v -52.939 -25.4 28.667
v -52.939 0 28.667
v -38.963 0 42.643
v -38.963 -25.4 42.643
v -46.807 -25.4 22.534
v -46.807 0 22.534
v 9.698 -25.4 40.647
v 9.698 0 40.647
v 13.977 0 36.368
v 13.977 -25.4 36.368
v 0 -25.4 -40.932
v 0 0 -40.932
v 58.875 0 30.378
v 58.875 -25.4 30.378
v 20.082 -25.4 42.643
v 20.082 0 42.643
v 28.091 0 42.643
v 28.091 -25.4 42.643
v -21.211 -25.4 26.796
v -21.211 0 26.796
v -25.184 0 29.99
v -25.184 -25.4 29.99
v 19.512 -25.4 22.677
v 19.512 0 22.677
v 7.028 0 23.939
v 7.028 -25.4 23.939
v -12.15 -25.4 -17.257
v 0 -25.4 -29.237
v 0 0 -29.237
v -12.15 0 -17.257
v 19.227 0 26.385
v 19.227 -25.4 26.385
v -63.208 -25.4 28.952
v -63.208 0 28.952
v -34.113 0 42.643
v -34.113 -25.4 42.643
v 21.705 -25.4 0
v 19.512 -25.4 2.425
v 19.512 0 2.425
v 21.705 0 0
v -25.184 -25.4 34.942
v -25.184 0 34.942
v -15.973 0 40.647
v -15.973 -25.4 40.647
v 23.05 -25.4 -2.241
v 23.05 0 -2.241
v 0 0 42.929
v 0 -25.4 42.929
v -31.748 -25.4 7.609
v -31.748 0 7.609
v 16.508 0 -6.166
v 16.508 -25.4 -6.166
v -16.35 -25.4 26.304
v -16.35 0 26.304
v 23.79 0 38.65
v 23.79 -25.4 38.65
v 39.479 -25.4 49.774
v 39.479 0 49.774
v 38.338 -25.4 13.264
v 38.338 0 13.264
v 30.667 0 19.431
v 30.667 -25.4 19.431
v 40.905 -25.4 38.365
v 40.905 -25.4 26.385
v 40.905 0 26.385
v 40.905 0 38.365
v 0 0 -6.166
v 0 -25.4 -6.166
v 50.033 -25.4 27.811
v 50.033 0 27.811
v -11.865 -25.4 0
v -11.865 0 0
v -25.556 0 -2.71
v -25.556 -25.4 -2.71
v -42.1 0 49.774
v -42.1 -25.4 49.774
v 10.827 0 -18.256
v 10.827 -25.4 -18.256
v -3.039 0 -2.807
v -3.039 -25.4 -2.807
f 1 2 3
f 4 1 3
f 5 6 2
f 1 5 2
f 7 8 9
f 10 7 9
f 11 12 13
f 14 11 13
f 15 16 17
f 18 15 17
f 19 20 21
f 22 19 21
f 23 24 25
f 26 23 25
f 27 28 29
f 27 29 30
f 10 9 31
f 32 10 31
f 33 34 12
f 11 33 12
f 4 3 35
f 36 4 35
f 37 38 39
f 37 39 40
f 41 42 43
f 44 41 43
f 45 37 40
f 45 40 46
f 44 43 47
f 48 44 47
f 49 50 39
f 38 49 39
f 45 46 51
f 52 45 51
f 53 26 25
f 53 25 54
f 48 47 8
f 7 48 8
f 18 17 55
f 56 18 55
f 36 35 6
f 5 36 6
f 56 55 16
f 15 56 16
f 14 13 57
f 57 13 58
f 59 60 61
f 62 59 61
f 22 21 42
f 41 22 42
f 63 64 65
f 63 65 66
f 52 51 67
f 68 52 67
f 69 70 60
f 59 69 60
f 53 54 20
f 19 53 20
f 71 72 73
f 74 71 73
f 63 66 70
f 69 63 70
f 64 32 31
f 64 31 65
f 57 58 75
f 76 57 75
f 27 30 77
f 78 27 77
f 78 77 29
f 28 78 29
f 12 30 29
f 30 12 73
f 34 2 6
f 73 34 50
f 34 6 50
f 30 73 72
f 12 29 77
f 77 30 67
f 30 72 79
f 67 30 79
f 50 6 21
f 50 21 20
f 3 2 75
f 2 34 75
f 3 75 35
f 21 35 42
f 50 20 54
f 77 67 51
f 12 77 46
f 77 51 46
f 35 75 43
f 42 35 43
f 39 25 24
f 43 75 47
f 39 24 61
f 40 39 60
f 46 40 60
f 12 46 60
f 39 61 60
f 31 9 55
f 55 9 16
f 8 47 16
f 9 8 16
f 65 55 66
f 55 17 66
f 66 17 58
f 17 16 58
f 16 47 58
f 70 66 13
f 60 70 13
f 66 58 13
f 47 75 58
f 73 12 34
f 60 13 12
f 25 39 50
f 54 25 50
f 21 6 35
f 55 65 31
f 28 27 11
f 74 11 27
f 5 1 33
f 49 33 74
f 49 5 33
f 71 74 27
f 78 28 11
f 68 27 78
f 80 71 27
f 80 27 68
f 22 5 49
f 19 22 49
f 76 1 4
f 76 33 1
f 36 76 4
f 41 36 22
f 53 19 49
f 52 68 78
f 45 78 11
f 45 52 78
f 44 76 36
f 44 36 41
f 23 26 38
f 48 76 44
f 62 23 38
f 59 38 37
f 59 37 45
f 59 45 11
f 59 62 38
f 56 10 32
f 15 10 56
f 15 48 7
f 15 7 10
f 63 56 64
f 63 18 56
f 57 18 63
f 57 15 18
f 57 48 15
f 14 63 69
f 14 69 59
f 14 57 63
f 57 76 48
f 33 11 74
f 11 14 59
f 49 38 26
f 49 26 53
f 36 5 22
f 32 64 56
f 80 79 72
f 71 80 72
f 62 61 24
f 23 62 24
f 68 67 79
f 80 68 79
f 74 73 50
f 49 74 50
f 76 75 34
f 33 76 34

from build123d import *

# Parameters (mm, degrees)
F1_DEPTH = 25.4


with BuildPart() as f1:
    # F0 (on Front) → F1 (new body)
    with BuildSketch(Plane.XZ):
        Polygon((39.478663, 49.774494), (-42.100161, 49.774494), (-63.207971, 28.951926), (0, -40.932029), (58.875032, 30.378129), align=None)
        Polygon((-25.556205, -2.709786), (-31.747603, 7.609214), (19.511815, 2.424546), (21.704745, 0), (23.049638, -2.241488), (16.5084, -6.16623), (0, -6.16623), (-3.038761, -2.806516), (-11.864654, 0), align=None, mode=Mode.SUBTRACT)
        Polygon((0, -29.237164), (-12.149894, -17.257059), (10.827228, -18.256486), align=None, mode=Mode.SUBTRACT)
        Polygon((-52.939307, 28.666684), (-38.962513, 42.643476), (-34.113426, 42.643476), (-46.806633, 22.53401), align=None, mode=Mode.SUBTRACT)
        Polygon((40.904865, 26.38476), (40.904865, 38.364865), (50.032564, 27.810963), (38.3377, 13.26369), (30.666579, 19.430669), (19.511815, 22.676632), (7.027925, 23.939323), (-16.350178, 26.303917), (-21.210515, 26.795519), (-25.183988, 29.989879), (-25.183988, 34.941979), (-15.973477, 40.646795), (0, 42.928718), (9.698181, 40.646795), (13.976795, 36.368181), (19.226575, 26.38476), align=None, mode=Mode.SUBTRACT)
        Polygon((23.79043, 38.650107), (20.082297, 42.643476), (28.090977, 42.643476), align=None, mode=Mode.SUBTRACT)
    extrude(amount=F1_DEPTH)


solid = f1.part
